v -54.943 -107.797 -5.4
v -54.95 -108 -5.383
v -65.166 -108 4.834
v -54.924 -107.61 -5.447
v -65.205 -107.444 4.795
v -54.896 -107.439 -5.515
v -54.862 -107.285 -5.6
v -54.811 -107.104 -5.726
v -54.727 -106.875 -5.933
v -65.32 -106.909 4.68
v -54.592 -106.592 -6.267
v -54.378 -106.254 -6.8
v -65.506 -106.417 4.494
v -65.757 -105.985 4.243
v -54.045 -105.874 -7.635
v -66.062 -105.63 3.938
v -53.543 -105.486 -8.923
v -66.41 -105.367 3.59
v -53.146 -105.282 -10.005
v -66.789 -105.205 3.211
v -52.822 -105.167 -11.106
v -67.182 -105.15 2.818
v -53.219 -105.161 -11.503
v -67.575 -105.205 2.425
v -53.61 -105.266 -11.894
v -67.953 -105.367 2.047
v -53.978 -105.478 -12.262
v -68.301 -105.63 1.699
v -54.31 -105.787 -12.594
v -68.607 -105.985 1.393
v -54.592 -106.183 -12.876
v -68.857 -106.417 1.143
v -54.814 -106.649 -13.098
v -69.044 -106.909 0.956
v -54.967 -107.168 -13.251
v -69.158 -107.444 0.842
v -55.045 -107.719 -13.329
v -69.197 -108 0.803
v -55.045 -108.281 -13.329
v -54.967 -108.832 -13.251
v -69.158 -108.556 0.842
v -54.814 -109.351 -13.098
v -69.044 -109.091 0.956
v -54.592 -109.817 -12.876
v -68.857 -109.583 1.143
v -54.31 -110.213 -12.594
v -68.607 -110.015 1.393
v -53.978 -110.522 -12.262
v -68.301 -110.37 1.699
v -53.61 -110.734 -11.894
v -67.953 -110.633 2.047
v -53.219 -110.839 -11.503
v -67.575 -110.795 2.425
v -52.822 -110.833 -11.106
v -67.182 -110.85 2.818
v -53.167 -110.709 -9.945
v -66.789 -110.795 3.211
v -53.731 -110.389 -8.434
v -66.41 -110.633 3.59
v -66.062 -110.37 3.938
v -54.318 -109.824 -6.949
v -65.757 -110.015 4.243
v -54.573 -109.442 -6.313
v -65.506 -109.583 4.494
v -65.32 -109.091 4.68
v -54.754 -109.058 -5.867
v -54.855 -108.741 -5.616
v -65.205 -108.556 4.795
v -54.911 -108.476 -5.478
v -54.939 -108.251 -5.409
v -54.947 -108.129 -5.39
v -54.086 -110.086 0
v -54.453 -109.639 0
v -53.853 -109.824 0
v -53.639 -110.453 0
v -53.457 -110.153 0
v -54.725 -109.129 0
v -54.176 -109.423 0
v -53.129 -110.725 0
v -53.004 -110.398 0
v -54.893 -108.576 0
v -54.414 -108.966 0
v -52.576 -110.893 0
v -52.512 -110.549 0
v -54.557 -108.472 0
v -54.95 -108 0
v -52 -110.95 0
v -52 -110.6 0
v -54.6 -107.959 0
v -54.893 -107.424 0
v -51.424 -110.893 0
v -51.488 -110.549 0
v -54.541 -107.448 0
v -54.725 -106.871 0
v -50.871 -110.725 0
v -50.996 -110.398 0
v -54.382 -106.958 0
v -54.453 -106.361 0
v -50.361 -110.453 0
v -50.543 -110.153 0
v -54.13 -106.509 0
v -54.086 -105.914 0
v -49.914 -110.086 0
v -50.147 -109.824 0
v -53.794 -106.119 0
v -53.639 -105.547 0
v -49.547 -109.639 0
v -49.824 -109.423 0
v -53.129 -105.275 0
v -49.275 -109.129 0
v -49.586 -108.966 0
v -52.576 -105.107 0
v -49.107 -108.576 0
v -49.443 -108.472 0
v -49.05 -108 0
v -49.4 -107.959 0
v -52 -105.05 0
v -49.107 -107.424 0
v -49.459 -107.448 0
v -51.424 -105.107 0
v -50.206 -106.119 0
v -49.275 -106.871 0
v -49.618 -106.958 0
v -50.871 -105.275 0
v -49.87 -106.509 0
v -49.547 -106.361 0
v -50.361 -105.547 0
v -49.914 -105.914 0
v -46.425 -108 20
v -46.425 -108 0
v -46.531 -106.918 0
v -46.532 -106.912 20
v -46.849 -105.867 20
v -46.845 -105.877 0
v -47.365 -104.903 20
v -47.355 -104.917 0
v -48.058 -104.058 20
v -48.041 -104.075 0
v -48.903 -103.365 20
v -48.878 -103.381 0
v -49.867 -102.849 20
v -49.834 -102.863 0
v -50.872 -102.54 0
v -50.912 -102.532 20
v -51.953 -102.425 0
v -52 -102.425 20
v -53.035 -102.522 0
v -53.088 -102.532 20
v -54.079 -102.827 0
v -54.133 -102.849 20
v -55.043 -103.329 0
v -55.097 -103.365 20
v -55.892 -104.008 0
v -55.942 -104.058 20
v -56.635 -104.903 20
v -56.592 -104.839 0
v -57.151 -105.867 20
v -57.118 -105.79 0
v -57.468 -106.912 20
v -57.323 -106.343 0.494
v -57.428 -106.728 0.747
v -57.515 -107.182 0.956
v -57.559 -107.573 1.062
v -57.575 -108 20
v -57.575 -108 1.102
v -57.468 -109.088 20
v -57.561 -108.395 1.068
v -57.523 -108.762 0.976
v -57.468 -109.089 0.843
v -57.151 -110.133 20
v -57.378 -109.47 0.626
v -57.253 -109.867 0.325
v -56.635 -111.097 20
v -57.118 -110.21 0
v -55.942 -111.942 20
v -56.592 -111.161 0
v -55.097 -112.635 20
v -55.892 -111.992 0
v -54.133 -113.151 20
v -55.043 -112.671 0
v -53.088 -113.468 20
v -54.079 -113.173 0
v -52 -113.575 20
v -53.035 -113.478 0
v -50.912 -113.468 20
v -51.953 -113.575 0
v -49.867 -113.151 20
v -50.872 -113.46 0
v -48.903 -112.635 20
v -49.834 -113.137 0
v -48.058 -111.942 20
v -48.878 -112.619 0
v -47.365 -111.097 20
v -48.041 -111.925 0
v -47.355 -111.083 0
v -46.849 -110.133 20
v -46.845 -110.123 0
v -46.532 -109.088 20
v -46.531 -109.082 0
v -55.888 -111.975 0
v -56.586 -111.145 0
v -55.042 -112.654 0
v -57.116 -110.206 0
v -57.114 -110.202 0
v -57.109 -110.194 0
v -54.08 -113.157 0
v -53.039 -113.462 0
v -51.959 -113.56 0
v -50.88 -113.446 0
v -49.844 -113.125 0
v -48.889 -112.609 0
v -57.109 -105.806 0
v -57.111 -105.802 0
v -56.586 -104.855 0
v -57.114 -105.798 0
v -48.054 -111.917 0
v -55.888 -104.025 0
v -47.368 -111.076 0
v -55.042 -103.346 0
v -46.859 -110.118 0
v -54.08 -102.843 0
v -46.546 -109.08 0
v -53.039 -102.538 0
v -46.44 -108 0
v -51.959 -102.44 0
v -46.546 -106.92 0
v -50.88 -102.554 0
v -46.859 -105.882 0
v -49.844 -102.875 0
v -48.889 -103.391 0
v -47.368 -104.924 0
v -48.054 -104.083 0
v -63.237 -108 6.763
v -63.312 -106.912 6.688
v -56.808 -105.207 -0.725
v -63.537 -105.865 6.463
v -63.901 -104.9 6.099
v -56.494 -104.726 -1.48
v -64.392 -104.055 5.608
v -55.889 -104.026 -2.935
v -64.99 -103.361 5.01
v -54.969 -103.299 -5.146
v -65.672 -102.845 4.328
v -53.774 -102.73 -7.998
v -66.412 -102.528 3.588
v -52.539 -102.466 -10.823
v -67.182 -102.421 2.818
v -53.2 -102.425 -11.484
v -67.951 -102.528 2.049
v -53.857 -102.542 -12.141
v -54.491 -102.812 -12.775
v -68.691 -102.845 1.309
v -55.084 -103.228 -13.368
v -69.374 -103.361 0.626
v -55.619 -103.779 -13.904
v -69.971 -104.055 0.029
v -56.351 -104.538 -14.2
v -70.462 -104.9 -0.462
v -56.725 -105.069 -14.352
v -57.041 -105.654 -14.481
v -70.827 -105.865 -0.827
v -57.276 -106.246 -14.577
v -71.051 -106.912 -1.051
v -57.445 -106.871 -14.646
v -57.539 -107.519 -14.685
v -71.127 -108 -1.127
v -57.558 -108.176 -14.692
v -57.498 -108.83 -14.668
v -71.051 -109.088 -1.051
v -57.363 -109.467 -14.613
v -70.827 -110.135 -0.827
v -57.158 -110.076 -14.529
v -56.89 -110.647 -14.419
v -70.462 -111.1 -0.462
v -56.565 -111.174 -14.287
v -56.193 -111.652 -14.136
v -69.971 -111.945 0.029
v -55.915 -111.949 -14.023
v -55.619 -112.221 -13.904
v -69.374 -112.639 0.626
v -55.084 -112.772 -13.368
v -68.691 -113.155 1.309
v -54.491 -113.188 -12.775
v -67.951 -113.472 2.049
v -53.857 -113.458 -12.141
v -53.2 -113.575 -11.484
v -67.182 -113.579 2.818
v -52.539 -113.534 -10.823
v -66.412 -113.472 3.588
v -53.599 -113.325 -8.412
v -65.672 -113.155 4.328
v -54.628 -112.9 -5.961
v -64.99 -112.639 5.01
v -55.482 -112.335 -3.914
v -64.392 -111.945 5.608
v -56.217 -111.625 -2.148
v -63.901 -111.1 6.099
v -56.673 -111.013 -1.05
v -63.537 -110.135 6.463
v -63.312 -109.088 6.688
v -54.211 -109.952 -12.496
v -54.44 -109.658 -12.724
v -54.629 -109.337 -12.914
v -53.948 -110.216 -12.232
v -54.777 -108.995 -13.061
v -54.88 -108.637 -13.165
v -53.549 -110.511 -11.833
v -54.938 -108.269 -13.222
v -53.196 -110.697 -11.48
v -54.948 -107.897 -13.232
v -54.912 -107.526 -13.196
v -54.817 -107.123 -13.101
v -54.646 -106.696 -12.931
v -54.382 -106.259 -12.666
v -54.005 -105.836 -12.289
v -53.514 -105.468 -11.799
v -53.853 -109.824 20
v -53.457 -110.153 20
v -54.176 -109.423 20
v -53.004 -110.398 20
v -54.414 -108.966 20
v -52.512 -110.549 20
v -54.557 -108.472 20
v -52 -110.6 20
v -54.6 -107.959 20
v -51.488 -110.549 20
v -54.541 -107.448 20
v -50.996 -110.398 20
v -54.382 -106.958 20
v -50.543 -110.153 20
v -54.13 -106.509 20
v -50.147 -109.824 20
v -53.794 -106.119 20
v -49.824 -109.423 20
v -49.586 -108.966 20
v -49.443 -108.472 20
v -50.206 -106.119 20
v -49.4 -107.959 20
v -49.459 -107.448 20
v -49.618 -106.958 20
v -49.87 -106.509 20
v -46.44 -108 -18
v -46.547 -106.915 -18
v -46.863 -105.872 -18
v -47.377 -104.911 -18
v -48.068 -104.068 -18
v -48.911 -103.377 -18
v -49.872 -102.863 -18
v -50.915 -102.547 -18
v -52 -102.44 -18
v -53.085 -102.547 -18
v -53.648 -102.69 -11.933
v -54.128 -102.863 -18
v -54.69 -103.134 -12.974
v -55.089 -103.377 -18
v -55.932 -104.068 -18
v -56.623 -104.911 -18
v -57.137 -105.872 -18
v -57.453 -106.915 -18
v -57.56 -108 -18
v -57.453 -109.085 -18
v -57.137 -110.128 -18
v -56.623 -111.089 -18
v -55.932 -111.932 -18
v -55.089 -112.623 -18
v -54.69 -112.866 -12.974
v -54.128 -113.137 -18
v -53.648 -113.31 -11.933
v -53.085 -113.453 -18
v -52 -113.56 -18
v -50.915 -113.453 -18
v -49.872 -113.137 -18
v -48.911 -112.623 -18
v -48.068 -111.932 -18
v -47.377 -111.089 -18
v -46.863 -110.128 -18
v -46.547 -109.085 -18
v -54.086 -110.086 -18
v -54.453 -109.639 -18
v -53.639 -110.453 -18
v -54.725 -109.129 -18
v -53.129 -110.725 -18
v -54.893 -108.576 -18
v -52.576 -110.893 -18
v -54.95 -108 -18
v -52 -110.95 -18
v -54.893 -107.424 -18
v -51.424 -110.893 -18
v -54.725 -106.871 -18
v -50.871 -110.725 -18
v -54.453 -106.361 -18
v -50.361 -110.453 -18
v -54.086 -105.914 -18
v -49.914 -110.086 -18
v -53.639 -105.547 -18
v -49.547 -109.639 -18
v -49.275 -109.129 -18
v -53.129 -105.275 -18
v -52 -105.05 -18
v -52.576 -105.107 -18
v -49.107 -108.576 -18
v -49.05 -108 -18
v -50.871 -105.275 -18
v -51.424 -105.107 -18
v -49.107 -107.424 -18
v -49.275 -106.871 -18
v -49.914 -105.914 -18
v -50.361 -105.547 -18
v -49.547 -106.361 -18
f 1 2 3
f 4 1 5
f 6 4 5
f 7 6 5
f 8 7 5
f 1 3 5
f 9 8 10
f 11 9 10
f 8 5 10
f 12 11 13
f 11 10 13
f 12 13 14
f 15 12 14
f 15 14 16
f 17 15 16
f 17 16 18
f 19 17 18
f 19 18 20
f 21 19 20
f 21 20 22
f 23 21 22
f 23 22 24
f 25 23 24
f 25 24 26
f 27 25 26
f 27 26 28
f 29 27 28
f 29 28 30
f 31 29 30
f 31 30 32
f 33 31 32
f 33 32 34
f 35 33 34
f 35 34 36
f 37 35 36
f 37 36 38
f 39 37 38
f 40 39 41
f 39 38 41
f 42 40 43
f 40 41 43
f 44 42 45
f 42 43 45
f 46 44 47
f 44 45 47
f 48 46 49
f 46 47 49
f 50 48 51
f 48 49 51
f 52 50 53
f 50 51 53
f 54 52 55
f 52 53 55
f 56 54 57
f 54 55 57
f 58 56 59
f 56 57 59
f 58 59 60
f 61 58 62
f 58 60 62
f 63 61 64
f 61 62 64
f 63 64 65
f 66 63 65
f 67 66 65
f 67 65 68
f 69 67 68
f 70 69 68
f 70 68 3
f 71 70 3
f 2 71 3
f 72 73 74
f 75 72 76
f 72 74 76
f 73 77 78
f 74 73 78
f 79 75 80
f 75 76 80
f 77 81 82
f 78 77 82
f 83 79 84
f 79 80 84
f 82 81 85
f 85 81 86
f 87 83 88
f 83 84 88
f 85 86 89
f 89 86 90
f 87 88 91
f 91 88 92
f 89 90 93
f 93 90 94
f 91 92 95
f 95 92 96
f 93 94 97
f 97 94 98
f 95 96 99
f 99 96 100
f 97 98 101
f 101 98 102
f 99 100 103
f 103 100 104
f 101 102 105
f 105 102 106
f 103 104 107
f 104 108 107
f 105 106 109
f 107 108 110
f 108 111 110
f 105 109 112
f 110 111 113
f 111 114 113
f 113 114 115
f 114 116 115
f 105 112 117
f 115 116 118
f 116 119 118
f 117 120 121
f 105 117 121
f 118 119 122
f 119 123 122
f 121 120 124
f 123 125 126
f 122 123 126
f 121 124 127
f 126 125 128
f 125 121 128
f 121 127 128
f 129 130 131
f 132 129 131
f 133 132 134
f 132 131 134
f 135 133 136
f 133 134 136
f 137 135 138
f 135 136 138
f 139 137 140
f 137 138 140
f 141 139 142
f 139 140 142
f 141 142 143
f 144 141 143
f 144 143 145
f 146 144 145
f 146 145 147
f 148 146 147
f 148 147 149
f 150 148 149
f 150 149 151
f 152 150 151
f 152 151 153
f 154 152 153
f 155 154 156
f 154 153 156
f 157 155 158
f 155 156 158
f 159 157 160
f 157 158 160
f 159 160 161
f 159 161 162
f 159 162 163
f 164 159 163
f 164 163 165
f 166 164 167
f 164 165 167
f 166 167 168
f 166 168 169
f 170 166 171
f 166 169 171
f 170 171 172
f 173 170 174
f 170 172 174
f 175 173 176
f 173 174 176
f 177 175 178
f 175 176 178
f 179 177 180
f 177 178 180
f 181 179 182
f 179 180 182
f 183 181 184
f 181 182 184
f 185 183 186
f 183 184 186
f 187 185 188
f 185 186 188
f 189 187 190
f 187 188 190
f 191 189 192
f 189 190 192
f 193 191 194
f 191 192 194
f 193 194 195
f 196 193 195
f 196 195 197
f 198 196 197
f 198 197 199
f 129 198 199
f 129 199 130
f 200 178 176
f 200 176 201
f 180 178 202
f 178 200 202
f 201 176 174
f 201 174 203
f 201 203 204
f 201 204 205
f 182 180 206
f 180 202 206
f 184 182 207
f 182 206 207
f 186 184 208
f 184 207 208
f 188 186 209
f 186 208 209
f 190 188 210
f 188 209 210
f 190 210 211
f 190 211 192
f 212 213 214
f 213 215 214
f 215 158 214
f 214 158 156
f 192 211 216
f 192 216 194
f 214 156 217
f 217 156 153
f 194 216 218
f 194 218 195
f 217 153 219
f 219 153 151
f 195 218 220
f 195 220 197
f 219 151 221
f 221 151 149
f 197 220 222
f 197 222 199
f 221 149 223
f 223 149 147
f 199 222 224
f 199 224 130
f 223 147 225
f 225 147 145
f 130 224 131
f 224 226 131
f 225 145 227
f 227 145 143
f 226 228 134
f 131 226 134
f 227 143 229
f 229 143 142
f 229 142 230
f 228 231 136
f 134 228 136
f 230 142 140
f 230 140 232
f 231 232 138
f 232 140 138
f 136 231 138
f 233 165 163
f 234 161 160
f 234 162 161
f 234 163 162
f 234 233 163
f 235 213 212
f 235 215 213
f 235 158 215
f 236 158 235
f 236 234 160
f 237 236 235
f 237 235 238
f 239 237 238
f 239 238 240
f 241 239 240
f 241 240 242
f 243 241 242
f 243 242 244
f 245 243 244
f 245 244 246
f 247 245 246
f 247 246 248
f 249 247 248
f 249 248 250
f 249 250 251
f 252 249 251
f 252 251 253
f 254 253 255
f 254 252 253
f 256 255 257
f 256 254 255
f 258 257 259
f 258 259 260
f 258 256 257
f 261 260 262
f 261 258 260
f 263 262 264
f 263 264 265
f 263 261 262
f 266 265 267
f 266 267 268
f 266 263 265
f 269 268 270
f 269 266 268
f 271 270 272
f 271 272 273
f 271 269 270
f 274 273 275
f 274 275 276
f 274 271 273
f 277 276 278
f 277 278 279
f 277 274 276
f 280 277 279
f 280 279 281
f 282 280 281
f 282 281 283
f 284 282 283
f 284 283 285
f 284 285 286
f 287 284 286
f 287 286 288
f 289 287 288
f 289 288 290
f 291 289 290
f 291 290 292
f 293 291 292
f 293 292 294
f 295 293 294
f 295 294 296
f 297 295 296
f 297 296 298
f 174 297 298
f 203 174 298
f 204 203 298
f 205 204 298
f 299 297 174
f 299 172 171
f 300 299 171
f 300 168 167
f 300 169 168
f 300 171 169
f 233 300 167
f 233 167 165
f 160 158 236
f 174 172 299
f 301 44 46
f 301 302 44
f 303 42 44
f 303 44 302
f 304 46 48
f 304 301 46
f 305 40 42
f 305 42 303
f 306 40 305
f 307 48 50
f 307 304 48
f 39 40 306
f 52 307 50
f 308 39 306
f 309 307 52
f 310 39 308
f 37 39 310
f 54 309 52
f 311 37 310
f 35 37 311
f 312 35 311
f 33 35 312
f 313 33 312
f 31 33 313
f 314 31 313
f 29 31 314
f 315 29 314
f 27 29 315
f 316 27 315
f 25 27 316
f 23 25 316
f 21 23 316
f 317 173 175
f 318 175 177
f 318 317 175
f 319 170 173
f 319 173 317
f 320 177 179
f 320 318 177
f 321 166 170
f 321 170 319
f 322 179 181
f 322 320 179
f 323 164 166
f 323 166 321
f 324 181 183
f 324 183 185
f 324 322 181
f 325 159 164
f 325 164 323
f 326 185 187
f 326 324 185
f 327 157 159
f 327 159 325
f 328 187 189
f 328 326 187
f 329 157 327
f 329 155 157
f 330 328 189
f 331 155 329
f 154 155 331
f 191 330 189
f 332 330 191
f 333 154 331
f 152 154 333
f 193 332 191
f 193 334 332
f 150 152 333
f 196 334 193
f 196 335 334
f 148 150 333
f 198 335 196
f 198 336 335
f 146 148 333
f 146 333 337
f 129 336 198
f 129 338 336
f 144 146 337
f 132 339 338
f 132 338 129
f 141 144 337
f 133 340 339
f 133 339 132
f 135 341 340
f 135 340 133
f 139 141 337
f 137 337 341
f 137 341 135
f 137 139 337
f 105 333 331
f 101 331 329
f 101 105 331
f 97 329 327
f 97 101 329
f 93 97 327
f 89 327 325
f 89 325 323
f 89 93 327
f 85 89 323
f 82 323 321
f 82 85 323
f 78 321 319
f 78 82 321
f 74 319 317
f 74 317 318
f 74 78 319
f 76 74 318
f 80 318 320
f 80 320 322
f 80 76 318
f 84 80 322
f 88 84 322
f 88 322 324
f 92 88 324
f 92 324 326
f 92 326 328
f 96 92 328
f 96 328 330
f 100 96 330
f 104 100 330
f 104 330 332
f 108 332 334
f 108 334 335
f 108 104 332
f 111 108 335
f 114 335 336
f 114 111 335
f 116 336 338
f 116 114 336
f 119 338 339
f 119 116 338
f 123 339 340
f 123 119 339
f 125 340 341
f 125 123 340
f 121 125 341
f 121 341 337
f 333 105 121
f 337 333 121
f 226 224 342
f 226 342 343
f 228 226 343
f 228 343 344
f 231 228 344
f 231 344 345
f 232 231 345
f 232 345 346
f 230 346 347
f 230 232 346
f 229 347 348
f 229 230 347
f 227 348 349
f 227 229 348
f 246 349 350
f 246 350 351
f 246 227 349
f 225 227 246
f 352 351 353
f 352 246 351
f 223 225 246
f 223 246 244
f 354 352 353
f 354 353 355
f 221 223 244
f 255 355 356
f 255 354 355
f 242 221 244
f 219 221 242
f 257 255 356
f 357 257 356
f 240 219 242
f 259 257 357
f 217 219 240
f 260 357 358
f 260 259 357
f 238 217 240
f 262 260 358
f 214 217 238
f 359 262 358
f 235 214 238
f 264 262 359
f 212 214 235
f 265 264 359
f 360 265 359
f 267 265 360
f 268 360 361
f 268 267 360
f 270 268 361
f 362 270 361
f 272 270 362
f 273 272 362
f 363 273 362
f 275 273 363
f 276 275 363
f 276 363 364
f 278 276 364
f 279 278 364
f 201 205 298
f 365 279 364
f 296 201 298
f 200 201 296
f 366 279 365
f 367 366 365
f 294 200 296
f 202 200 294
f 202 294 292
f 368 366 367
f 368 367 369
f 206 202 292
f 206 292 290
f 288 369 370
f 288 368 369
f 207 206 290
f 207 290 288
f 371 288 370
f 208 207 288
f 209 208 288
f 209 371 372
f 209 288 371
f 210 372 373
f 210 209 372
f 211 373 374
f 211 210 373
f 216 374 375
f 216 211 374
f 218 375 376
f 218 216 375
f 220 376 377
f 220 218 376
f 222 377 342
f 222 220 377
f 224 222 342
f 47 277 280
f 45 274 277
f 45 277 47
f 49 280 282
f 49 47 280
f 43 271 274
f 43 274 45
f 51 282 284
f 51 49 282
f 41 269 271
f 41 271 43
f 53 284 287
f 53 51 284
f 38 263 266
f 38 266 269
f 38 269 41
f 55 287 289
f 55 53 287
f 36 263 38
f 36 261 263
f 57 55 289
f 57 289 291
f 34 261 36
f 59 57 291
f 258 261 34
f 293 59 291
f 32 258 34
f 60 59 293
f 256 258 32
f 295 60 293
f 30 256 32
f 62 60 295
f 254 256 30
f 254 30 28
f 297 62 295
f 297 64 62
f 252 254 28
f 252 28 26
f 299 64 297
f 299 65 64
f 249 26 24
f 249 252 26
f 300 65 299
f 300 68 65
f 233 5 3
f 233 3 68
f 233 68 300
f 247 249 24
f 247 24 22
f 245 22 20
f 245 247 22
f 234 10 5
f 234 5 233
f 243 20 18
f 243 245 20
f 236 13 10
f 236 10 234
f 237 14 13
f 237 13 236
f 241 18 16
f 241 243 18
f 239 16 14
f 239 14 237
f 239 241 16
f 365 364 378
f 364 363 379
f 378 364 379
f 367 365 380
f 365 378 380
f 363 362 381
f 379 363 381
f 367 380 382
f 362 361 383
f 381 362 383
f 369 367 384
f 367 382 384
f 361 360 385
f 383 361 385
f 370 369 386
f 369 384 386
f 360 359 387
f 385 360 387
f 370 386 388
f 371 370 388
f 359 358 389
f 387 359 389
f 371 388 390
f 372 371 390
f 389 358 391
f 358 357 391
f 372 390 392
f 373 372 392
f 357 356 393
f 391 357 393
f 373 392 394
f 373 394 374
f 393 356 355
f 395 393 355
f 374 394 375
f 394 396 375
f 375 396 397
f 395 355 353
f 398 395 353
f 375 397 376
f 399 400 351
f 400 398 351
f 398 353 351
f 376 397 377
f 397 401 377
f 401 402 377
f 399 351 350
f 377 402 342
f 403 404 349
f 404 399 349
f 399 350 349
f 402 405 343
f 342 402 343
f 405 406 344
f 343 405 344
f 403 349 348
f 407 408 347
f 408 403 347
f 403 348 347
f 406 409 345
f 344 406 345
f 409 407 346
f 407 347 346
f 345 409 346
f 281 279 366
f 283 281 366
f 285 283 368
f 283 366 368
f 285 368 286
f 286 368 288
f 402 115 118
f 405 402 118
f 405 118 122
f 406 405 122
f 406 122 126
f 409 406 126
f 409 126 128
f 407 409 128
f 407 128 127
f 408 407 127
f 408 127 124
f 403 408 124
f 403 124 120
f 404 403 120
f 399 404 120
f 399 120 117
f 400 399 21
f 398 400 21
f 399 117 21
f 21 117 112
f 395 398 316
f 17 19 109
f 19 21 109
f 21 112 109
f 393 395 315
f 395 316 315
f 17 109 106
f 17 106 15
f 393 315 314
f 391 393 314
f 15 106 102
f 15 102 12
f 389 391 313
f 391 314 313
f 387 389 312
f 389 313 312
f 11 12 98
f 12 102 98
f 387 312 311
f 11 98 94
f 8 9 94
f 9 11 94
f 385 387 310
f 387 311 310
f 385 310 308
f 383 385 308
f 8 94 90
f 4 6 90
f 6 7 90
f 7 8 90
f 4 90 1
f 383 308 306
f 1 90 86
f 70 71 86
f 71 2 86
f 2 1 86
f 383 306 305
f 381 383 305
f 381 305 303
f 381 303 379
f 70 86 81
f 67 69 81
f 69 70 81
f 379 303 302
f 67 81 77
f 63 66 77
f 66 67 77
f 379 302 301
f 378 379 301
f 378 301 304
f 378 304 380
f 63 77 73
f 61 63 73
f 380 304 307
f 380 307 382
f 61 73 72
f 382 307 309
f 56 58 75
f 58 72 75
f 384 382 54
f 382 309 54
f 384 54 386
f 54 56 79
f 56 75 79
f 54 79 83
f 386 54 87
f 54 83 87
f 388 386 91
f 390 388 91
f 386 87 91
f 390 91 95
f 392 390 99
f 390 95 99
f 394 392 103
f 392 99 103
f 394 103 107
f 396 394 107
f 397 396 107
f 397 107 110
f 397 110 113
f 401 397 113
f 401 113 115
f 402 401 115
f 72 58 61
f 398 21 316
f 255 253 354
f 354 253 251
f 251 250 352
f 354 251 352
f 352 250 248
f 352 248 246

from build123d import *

# Parameters (mm, degrees)
SKETCH841_R     = 5.575015
PAD364_DEPTH    = 20
SKETCH842_R     = 5.560307
PAD365_DEPTH    = 18
SKETCH843_R     = 5.579276
PAD366_DEPTH    = 20
SKETCH844_R     = 2.85
POCKET224_DEPTH = 20
SKETCH845_R     = 2.95
POCKET225_DEPTH = 18.001


with BuildPart() as part:
    # Sketch841 → Pad364 (new body)
    with BuildSketch(Plane.XY):
        Circle(SKETCH841_R)
        with BuildLine():
            ThreePointArc((-1.794436, 1.881489), (0, -2.6), (1.794436, 1.881489))
            Line((-1.794436, 1.881489), (1.794436, 1.881489))
        make_face(mode=Mode.SUBTRACT)
    extrude(amount=PAD364_DEPTH)

    # Sketch842 → Pad365 (join)
    with BuildSketch(Plane.XY):
        Circle(SKETCH842_R)
    extrude(amount=-PAD365_DEPTH)

    # Sketch843 → Pad366 (join)
    with BuildSketch(Plane(origin=(-9, 0, 9), x_dir=(0.707107, 0, 0.707107), z_dir=(-0.707107, 0, 0.707107))):
        with Locations((-8.742249, 0)):
            Circle(SKETCH843_R)
    extrude(amount=-PAD366_DEPTH)

    # Sketch844 → Pocket224 (cut)
    with BuildSketch(Plane(origin=(-9, 0, 9), x_dir=(0.707107, 0, 0.707107), z_dir=(-0.707107, 0, 0.707107))):
        with Locations((-8.742247, 0)):
            Circle(SKETCH844_R)
    extrude(amount=-POCKET224_DEPTH, mode=Mode.SUBTRACT)

    # Sketch845 → Pocket225 (cut, through all)
    with BuildSketch(Plane.XY):
        Circle(SKETCH845_R)
    extrude(amount=-POCKET225_DEPTH, mode=Mode.SUBTRACT)


with BuildPart() as part_1:
    # Body064 placement: moved
    add(part.part.moved(Location((-52, -108, 0))))


solid = part_1.part
